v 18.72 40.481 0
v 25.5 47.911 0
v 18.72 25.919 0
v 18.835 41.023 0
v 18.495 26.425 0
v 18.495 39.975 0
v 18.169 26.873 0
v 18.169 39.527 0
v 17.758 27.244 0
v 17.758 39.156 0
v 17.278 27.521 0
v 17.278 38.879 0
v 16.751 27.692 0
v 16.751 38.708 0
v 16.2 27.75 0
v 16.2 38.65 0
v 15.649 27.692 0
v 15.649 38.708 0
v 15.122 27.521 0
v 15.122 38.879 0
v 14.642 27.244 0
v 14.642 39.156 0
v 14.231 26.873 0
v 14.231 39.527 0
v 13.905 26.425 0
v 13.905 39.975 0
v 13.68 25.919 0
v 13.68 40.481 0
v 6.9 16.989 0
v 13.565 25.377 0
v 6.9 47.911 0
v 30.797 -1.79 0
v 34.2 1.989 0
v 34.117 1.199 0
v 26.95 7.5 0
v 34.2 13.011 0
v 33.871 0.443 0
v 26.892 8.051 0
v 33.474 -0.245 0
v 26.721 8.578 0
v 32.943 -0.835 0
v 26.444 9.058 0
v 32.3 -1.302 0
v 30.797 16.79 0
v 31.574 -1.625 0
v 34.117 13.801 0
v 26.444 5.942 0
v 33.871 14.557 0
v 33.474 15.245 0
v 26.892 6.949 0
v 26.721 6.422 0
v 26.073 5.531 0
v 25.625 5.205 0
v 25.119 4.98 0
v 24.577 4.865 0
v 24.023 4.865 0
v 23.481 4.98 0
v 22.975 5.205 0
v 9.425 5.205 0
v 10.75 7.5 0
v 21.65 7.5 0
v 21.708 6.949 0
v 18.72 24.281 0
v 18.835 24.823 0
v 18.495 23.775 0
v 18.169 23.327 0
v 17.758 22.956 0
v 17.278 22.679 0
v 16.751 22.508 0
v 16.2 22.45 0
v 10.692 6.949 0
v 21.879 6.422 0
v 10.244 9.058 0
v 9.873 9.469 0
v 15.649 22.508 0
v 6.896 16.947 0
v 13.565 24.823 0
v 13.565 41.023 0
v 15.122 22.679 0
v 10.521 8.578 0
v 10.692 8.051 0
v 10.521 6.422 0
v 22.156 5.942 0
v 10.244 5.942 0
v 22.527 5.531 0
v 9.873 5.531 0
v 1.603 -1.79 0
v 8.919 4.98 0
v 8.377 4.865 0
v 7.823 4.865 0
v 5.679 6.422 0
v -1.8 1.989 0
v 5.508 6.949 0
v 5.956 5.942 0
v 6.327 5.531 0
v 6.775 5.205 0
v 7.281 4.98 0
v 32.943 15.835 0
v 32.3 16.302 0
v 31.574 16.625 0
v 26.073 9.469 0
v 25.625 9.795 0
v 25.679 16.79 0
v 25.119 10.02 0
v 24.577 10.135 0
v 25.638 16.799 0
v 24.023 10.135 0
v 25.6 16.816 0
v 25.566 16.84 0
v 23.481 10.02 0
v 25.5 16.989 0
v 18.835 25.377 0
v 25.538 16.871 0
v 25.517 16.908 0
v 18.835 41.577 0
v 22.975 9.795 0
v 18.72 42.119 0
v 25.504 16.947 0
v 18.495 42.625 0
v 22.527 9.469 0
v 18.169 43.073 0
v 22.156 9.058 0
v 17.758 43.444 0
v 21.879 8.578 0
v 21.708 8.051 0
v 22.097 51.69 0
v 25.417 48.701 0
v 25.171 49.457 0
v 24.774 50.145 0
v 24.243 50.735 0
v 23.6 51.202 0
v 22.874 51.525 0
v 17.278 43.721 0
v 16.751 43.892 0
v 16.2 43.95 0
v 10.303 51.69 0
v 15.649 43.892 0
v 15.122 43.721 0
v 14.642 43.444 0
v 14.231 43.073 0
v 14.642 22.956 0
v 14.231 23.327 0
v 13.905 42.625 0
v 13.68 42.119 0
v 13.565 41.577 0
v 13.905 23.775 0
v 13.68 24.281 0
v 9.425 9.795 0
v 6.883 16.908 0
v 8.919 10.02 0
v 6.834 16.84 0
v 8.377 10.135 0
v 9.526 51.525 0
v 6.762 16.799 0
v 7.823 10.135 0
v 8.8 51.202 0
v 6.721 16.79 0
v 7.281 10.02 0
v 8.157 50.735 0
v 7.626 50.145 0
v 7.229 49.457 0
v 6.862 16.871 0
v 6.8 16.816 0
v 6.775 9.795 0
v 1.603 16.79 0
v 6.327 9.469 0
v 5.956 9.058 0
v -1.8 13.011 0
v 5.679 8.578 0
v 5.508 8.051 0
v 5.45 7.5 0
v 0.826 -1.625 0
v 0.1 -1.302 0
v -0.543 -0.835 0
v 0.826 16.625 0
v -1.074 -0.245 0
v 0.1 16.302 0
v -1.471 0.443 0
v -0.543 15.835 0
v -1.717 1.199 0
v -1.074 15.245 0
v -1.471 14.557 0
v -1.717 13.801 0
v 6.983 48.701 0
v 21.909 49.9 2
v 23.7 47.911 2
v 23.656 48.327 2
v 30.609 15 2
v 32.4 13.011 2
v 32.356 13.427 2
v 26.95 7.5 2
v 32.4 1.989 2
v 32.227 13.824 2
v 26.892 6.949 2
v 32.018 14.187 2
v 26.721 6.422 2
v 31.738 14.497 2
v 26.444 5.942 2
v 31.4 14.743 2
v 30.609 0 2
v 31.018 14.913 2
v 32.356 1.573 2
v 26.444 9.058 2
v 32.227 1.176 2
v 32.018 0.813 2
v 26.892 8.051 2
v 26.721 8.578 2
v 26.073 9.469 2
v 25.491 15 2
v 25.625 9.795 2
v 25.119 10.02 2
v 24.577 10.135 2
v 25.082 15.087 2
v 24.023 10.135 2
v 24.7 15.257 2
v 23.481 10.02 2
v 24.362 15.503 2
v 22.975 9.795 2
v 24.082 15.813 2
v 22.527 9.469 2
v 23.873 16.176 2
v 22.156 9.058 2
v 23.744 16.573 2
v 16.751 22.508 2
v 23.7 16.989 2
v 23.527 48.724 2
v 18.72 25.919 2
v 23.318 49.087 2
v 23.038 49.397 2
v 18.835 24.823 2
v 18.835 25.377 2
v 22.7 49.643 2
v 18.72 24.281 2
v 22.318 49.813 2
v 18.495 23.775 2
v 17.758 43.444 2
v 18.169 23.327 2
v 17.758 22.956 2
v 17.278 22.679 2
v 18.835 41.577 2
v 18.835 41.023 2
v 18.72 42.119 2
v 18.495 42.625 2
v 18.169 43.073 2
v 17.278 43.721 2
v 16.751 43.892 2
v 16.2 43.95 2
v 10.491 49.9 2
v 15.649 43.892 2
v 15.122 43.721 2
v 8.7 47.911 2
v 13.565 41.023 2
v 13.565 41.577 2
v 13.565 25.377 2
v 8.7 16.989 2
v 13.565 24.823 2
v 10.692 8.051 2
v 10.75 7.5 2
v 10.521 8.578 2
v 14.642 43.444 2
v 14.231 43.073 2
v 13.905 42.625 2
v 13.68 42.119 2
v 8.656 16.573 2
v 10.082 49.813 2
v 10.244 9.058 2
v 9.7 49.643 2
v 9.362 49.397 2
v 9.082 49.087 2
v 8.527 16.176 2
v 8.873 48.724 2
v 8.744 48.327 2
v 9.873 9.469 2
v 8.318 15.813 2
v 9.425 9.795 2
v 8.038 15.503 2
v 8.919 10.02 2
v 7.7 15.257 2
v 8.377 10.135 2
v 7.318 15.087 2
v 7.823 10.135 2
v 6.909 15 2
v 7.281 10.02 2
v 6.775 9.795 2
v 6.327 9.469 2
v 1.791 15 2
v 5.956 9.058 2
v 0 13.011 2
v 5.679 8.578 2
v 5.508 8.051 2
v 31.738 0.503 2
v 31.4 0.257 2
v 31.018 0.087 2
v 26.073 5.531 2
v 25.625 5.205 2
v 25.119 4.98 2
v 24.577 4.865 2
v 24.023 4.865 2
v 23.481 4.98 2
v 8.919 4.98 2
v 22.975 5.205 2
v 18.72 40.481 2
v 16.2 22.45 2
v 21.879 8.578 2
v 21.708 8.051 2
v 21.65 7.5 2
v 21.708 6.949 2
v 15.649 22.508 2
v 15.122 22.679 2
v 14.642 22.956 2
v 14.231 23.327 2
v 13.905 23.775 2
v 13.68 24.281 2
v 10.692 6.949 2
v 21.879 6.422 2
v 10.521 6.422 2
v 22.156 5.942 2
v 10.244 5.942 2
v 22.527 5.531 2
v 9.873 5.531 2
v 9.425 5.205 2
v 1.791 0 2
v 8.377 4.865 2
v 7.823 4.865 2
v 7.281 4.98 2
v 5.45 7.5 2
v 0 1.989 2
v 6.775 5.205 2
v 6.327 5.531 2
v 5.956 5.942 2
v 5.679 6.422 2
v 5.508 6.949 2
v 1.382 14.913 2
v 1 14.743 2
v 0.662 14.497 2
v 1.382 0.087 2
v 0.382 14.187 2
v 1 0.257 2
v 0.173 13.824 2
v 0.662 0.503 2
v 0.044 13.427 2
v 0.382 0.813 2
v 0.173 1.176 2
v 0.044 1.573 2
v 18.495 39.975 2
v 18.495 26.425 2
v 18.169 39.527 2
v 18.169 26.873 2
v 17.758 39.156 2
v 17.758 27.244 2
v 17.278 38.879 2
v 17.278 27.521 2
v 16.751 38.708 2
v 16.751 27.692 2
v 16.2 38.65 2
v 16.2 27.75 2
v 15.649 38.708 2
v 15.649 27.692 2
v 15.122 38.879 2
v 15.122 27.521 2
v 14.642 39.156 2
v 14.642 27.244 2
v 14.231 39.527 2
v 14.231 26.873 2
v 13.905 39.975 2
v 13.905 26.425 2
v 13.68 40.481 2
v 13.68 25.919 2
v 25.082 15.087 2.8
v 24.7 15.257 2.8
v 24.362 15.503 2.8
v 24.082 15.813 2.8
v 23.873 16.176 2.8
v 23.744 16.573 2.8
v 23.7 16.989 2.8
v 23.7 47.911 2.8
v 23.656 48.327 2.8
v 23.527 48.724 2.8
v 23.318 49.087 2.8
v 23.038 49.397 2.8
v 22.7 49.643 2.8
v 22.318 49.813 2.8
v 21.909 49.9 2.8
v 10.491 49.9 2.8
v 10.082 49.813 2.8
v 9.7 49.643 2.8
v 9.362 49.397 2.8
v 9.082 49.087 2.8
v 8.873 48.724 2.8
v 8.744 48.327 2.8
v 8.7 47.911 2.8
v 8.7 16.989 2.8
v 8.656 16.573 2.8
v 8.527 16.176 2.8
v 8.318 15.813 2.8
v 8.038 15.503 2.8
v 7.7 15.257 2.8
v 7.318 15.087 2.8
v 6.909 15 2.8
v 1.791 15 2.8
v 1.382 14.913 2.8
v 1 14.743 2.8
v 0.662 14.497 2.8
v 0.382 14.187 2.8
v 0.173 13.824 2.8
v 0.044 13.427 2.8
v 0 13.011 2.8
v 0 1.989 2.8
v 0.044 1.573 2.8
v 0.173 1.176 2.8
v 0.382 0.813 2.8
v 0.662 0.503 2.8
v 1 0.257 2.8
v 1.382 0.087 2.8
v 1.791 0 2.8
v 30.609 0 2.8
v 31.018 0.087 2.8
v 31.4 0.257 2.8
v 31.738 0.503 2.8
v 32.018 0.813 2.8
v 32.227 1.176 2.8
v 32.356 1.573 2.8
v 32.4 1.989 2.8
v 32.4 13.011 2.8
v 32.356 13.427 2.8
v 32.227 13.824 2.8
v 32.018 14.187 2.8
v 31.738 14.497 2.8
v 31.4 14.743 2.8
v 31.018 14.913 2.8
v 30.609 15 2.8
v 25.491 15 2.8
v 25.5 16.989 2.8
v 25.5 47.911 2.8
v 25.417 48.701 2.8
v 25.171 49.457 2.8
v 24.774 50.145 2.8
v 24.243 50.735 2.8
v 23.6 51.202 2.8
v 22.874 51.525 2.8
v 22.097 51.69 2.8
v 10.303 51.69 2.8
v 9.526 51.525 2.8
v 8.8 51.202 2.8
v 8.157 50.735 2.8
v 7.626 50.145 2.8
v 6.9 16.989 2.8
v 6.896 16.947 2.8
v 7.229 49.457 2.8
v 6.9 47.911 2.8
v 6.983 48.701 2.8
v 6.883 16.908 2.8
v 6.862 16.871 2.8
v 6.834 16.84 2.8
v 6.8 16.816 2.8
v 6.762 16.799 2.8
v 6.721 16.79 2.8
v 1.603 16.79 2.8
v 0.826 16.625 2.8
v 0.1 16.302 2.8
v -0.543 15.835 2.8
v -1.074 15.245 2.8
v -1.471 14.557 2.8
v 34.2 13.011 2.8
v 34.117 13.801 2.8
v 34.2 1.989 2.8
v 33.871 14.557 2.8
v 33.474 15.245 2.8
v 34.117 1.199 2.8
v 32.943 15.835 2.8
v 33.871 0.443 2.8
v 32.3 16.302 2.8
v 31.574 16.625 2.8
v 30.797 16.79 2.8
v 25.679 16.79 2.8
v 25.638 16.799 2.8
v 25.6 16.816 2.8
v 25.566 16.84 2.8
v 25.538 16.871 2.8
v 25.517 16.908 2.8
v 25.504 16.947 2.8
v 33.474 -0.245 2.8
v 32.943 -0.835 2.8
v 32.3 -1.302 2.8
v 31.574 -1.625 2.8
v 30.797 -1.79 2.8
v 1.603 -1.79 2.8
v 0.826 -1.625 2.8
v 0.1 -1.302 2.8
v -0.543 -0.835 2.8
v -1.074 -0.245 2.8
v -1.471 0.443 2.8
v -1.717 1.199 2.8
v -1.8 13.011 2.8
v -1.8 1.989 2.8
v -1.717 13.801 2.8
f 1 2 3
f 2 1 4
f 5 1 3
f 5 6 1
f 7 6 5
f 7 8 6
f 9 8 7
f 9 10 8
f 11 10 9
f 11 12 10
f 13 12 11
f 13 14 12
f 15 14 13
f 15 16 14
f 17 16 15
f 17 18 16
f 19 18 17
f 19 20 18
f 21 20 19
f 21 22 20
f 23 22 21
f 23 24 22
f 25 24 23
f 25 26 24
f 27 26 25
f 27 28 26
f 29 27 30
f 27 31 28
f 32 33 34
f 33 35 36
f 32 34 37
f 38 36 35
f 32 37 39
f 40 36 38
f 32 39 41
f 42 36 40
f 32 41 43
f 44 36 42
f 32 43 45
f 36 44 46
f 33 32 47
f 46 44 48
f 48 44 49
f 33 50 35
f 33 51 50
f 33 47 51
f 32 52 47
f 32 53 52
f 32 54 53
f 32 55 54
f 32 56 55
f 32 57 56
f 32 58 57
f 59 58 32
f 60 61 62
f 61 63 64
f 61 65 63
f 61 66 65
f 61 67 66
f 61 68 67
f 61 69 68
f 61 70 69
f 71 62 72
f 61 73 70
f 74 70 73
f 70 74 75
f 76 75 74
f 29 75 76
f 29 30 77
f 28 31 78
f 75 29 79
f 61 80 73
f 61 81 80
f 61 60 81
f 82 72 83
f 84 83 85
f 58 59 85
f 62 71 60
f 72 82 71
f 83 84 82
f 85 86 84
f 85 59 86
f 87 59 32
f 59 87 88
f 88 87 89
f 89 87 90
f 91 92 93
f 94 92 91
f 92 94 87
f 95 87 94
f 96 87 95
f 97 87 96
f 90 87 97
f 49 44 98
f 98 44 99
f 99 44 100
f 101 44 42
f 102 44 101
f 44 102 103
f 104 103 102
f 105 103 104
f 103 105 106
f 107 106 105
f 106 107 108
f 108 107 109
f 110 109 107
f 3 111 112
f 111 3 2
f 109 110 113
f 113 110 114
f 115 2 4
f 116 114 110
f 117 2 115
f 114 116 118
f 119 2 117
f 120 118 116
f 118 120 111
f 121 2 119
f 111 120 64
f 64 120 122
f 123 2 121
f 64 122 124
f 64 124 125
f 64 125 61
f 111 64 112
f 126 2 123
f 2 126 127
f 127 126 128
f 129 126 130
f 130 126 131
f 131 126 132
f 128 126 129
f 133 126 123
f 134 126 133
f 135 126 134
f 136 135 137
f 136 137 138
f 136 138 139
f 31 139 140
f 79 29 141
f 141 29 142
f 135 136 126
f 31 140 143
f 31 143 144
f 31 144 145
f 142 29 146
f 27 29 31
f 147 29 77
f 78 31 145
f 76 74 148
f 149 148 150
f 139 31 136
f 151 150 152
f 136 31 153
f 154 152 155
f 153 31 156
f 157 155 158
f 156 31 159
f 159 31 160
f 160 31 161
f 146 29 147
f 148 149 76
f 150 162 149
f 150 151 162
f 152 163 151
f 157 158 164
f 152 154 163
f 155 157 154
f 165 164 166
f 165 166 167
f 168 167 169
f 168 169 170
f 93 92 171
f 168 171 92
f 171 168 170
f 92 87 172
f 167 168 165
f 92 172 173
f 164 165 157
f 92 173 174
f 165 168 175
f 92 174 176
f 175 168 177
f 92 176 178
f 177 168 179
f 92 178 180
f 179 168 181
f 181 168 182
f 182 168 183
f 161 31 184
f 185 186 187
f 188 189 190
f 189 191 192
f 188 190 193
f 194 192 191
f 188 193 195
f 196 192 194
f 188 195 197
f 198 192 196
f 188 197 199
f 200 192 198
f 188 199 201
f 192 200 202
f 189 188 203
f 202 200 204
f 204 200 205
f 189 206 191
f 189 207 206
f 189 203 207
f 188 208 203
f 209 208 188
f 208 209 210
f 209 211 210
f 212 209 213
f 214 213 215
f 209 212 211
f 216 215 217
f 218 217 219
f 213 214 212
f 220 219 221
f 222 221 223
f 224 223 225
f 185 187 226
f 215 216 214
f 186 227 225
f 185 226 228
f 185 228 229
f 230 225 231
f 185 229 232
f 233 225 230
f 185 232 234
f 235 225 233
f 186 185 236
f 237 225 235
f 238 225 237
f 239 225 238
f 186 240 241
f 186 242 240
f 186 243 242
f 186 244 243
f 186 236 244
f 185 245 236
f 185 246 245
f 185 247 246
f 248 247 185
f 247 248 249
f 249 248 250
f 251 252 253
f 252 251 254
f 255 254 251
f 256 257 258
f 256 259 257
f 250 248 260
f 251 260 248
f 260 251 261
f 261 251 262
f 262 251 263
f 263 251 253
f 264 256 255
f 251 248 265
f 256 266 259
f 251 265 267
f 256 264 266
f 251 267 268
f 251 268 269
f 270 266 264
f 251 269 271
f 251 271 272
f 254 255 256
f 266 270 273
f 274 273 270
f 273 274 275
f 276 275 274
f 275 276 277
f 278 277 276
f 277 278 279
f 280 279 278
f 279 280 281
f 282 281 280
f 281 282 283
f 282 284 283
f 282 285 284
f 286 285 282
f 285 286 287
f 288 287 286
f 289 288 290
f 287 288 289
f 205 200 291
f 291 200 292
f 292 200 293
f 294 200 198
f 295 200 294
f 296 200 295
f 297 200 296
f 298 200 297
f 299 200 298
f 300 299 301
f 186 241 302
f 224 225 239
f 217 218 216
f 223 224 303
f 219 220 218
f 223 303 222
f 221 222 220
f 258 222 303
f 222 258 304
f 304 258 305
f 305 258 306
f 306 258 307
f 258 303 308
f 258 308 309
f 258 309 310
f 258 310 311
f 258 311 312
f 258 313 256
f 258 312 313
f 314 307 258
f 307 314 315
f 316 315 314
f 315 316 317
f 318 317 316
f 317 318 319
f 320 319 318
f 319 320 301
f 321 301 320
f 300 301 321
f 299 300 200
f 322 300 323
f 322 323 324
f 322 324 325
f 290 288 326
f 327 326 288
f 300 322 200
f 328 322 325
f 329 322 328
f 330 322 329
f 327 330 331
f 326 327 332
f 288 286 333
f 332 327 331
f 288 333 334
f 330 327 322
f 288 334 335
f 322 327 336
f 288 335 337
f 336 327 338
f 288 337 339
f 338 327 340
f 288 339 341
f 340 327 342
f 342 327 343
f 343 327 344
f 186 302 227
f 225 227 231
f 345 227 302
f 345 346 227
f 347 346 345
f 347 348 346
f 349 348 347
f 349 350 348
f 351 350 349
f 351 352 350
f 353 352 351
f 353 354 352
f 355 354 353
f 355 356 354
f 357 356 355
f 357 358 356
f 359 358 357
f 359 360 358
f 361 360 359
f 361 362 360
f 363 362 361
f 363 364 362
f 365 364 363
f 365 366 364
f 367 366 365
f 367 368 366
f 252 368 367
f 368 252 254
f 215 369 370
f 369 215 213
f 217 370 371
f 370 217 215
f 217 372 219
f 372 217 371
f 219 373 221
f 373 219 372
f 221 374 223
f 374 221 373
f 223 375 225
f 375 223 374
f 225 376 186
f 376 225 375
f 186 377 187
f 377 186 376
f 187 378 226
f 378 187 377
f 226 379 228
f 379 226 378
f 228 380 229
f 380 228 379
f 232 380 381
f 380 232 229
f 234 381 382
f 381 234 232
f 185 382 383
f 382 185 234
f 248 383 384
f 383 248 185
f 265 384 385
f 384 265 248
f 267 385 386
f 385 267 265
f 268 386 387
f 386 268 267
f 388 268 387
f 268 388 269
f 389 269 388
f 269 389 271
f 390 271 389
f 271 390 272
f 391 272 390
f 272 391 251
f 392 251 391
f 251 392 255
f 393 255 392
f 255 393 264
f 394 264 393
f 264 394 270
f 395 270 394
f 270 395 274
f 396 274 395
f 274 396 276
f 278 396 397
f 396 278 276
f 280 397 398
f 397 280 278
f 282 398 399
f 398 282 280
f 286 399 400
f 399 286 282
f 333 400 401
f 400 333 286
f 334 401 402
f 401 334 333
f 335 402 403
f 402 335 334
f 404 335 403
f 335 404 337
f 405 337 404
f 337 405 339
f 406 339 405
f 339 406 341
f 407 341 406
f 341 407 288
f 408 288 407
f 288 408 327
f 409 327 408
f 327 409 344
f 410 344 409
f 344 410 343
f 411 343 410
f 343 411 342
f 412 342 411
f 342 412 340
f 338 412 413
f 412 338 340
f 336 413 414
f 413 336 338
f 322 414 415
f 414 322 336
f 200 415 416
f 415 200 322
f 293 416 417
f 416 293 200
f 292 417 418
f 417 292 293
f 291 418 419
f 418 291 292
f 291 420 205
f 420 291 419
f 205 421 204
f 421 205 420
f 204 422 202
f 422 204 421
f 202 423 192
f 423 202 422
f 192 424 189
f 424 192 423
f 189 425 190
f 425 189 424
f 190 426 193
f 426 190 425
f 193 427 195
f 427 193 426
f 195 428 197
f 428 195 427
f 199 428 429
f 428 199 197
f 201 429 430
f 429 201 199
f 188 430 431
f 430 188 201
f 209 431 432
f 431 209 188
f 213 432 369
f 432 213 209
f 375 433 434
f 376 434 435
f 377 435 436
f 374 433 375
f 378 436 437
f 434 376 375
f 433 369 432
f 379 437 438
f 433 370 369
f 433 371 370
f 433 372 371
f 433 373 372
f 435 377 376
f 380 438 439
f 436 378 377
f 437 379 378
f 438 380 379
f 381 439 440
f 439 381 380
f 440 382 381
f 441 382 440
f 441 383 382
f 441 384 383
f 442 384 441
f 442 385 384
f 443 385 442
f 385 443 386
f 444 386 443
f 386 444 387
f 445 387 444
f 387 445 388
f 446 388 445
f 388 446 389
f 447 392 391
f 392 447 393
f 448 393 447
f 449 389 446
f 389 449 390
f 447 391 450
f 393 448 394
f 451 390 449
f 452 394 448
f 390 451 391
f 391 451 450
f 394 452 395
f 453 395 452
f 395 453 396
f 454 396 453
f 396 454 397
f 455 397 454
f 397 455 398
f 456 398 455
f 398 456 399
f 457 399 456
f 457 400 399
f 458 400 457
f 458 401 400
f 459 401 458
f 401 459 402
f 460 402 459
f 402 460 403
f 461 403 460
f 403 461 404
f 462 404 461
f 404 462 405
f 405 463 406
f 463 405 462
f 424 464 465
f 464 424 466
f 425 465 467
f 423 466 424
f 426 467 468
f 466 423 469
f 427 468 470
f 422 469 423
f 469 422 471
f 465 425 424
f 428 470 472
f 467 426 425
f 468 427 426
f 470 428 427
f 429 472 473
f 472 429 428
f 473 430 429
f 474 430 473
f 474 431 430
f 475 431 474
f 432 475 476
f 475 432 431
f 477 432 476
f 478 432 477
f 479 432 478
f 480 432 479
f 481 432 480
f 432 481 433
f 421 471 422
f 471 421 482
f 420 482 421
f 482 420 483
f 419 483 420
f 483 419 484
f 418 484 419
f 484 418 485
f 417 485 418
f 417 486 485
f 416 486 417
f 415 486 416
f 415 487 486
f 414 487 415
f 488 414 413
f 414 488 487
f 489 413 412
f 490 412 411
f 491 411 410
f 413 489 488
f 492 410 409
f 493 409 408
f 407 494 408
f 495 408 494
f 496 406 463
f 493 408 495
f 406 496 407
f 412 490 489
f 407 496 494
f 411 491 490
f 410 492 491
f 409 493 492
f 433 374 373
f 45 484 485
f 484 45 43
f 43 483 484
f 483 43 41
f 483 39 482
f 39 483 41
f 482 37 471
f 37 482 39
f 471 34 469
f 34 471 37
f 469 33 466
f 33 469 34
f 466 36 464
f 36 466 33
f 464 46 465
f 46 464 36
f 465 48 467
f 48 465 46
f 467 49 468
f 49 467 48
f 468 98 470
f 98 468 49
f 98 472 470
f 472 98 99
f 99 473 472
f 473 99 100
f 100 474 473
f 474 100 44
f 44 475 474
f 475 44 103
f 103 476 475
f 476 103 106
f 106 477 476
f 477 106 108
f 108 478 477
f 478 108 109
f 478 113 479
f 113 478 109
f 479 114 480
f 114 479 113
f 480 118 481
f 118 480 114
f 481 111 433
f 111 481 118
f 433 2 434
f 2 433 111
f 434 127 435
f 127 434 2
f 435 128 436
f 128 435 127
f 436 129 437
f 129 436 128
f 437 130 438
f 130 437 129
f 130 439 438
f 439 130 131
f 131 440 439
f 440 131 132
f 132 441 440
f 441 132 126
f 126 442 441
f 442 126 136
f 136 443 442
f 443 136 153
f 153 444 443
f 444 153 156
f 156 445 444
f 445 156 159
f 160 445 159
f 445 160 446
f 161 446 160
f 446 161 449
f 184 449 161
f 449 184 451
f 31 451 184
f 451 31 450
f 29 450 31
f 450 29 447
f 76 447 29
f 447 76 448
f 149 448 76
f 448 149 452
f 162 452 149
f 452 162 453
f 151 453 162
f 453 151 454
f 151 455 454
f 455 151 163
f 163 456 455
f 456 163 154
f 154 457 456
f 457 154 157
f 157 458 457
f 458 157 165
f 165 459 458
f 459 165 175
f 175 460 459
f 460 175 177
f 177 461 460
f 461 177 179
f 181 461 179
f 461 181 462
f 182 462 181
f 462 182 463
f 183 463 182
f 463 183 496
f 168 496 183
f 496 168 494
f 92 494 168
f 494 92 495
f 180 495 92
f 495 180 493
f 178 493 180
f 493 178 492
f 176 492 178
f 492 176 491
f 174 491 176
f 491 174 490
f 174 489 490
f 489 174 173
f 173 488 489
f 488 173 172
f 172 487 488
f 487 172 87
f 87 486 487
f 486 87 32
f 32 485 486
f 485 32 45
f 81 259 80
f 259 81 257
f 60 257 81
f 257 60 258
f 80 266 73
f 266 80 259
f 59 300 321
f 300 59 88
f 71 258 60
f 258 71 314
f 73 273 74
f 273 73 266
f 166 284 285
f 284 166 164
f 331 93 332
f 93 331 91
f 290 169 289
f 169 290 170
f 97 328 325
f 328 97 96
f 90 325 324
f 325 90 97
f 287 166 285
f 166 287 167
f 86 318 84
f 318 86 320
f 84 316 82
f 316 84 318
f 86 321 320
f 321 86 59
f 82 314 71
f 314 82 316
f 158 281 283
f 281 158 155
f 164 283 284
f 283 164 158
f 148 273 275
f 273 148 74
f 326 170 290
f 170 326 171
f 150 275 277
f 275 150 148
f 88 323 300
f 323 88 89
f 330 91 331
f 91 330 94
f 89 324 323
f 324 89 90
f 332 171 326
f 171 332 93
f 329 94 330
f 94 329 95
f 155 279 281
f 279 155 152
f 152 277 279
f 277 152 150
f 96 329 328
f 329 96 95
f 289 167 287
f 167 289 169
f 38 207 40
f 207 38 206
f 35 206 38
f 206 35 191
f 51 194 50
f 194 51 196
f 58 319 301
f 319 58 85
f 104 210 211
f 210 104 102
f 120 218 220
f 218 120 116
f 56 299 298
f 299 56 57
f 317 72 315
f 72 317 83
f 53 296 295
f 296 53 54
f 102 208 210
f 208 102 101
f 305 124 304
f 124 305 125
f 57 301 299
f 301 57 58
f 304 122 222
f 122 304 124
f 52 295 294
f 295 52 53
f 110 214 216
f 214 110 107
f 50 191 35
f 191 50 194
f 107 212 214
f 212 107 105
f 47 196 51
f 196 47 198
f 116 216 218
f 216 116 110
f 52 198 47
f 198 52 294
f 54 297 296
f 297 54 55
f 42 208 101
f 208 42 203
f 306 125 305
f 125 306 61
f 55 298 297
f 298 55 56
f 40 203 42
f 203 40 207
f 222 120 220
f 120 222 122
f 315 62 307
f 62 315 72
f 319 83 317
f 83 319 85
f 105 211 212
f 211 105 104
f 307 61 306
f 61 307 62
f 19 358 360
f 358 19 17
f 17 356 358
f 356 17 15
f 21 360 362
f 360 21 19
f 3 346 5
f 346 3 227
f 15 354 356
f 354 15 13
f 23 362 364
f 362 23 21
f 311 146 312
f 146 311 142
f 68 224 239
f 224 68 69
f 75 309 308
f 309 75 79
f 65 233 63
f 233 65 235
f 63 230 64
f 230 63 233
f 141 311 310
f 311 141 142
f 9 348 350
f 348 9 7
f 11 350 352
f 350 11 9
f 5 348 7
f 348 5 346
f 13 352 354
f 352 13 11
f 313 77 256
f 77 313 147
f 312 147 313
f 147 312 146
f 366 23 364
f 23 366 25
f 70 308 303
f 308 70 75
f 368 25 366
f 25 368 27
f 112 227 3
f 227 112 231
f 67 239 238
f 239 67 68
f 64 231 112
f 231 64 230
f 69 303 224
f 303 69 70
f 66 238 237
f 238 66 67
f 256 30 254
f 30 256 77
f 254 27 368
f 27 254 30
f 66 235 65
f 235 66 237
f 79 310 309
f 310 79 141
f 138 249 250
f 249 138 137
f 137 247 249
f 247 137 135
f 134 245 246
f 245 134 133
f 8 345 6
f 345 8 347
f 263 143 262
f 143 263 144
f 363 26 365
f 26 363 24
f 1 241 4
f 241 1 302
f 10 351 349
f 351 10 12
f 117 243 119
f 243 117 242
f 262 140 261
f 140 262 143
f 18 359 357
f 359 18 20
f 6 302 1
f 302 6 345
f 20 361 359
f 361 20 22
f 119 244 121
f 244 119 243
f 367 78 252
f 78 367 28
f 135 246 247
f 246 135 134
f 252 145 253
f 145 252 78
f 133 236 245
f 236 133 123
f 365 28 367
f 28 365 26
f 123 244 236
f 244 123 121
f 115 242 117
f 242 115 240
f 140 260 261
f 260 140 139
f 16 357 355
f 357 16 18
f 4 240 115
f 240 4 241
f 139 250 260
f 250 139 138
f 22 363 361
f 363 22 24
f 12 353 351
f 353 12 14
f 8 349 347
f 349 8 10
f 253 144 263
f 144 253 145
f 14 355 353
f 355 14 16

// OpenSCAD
// T-Track definition: how wide is it?
trackWidth = 20.0;

// Mounting hardware definition: how long are the inserts you are using?
hardwareLength = 15.2;

// Extra space between T-track mounting brackets
extraSpace = 1.0;

// Screw hole size (make it a bit bigger than your screws)
holeSize = 5.3;

// Upper bar of the T: number of holes
upperBarNumHoles = 2;

// Vertical bar of the T: number of holes
verticalBarNumHoles = 2;

// The width of the part
mainWidth = 15.0;

// Corner radius:
cornerRadius = 2;

// Main thickness:
thickness = 2.0;

// Rim thickness 
rimThickness = 0.8;

// Rim width
rimWidth = 1.8;

/* [Hidden] */
// Hole resolution
$fn = 30;


// Code imported from scad-utils:
// Copyright (c) 2013 Oskar Linde. All rights reserved.
// License: BSD
//
// This library contains basic 2D morphology operations
//
// outset(d=1)            - creates a polygon at an offset d outside a 2D shape
// inset(d=1)             - creates a polygon at an offset d inside a 2D shape
// fillet(r=1)            - adds fillets of radius r to all concave corners of a 2D shape
// rounding(r=1)          - adds rounding to all convex corners of a 2D shape
// shell(d,center=false)  - makes a shell of width d along the edge of a 2D shape
//                        - positive values of d places the shell on the outside
//                        - negative values of d places the shell on the inside
//                        - center=true and positive d places the shell centered on the edge

module outset(d=1) {
	// Bug workaround for older OpenSCAD versions
	minkowski() {
		circle(r=d);
		children();
	}
}

module outset_extruded(d=1) {
   projection(cut=true) minkowski() {
        cylinder(r=d);
        linear_extrude(center=true) children();
   }
}

module inset(d=1) {
	 render() inverse() outset(d=d) inverse() children();
}

module fillet(r=1) {
	inset(d=r) render() outset(d=r) children();
}

module rounding(r=1) {
	outset(d=r) inset(d=r) children();
}

module shell(d,center=false) {
	if (center && d > 0) {
		difference() {
			outset(d=d/2) children();
			inset(d=d/2) children();
		}
	}
	if (!center && d > 0) {
		difference() {
			outset(d=d) children();
			children();
		}
	}
	if (!center && d < 0) {
		difference() {
			children();
			inset(d=-d) children();
		}
	}
	if (d == 0) children();
}


// Below are for internal use only

module inverse() {
	difference() {
		square(1e5,center=true);
		children();
	}
}




// End import from scad-utils











extraHardwareSpace = (trackWidth - mainWidth) / 2;
upperBarWidth = upperBarNumHoles * (hardwareLength+extraSpace);
verticalBarHeight = verticalBarNumHoles * (hardwareLength+extraSpace) + extraHardwareSpace;


module bracket2DSquare () {
    square ([upperBarWidth,mainWidth]);
    translate ([(upperBarWidth-mainWidth)/2,mainWidth,0]) {
        square ([mainWidth, verticalBarHeight]);
    }
}

module bracket2DRounded () {
    rounding(r=cornerRadius) fillet(r=cornerRadius) bracket2DSquare();
}

module rim2D () {
    shell(d=rimWidth) bracket2DRounded ();
}

module bracket3D () {
    linear_extrude (height=thickness) bracket2DRounded ();
    linear_extrude (height=thickness+rimThickness) rim2D();
}

module holePuncher (thisHole, numHoles) {
    if (thisHole < numHoles) {
        cylinder (d = holeSize, h = 4* thickness, center = true);
        translate ([hardwareLength+extraSpace,0,0]) {
            holePuncher (thisHole + 1, numHoles);
        }
    }
}

module punchUpperBarHoles () {
    translate ([(hardwareLength+extraSpace)/2,mainWidth/2,0]) {
        holePuncher(0,upperBarNumHoles);
    }
}

module punchVerticalBarHoles () {
    translate ([upperBarWidth/2,mainWidth+extraHardwareSpace+hardwareLength/2,0]) {
        rotate (90) {
            holePuncher(0,verticalBarNumHoles);
        }
    }
}

difference () {
    bracket3D();
    punchUpperBarHoles();
    punchVerticalBarHoles();
}
